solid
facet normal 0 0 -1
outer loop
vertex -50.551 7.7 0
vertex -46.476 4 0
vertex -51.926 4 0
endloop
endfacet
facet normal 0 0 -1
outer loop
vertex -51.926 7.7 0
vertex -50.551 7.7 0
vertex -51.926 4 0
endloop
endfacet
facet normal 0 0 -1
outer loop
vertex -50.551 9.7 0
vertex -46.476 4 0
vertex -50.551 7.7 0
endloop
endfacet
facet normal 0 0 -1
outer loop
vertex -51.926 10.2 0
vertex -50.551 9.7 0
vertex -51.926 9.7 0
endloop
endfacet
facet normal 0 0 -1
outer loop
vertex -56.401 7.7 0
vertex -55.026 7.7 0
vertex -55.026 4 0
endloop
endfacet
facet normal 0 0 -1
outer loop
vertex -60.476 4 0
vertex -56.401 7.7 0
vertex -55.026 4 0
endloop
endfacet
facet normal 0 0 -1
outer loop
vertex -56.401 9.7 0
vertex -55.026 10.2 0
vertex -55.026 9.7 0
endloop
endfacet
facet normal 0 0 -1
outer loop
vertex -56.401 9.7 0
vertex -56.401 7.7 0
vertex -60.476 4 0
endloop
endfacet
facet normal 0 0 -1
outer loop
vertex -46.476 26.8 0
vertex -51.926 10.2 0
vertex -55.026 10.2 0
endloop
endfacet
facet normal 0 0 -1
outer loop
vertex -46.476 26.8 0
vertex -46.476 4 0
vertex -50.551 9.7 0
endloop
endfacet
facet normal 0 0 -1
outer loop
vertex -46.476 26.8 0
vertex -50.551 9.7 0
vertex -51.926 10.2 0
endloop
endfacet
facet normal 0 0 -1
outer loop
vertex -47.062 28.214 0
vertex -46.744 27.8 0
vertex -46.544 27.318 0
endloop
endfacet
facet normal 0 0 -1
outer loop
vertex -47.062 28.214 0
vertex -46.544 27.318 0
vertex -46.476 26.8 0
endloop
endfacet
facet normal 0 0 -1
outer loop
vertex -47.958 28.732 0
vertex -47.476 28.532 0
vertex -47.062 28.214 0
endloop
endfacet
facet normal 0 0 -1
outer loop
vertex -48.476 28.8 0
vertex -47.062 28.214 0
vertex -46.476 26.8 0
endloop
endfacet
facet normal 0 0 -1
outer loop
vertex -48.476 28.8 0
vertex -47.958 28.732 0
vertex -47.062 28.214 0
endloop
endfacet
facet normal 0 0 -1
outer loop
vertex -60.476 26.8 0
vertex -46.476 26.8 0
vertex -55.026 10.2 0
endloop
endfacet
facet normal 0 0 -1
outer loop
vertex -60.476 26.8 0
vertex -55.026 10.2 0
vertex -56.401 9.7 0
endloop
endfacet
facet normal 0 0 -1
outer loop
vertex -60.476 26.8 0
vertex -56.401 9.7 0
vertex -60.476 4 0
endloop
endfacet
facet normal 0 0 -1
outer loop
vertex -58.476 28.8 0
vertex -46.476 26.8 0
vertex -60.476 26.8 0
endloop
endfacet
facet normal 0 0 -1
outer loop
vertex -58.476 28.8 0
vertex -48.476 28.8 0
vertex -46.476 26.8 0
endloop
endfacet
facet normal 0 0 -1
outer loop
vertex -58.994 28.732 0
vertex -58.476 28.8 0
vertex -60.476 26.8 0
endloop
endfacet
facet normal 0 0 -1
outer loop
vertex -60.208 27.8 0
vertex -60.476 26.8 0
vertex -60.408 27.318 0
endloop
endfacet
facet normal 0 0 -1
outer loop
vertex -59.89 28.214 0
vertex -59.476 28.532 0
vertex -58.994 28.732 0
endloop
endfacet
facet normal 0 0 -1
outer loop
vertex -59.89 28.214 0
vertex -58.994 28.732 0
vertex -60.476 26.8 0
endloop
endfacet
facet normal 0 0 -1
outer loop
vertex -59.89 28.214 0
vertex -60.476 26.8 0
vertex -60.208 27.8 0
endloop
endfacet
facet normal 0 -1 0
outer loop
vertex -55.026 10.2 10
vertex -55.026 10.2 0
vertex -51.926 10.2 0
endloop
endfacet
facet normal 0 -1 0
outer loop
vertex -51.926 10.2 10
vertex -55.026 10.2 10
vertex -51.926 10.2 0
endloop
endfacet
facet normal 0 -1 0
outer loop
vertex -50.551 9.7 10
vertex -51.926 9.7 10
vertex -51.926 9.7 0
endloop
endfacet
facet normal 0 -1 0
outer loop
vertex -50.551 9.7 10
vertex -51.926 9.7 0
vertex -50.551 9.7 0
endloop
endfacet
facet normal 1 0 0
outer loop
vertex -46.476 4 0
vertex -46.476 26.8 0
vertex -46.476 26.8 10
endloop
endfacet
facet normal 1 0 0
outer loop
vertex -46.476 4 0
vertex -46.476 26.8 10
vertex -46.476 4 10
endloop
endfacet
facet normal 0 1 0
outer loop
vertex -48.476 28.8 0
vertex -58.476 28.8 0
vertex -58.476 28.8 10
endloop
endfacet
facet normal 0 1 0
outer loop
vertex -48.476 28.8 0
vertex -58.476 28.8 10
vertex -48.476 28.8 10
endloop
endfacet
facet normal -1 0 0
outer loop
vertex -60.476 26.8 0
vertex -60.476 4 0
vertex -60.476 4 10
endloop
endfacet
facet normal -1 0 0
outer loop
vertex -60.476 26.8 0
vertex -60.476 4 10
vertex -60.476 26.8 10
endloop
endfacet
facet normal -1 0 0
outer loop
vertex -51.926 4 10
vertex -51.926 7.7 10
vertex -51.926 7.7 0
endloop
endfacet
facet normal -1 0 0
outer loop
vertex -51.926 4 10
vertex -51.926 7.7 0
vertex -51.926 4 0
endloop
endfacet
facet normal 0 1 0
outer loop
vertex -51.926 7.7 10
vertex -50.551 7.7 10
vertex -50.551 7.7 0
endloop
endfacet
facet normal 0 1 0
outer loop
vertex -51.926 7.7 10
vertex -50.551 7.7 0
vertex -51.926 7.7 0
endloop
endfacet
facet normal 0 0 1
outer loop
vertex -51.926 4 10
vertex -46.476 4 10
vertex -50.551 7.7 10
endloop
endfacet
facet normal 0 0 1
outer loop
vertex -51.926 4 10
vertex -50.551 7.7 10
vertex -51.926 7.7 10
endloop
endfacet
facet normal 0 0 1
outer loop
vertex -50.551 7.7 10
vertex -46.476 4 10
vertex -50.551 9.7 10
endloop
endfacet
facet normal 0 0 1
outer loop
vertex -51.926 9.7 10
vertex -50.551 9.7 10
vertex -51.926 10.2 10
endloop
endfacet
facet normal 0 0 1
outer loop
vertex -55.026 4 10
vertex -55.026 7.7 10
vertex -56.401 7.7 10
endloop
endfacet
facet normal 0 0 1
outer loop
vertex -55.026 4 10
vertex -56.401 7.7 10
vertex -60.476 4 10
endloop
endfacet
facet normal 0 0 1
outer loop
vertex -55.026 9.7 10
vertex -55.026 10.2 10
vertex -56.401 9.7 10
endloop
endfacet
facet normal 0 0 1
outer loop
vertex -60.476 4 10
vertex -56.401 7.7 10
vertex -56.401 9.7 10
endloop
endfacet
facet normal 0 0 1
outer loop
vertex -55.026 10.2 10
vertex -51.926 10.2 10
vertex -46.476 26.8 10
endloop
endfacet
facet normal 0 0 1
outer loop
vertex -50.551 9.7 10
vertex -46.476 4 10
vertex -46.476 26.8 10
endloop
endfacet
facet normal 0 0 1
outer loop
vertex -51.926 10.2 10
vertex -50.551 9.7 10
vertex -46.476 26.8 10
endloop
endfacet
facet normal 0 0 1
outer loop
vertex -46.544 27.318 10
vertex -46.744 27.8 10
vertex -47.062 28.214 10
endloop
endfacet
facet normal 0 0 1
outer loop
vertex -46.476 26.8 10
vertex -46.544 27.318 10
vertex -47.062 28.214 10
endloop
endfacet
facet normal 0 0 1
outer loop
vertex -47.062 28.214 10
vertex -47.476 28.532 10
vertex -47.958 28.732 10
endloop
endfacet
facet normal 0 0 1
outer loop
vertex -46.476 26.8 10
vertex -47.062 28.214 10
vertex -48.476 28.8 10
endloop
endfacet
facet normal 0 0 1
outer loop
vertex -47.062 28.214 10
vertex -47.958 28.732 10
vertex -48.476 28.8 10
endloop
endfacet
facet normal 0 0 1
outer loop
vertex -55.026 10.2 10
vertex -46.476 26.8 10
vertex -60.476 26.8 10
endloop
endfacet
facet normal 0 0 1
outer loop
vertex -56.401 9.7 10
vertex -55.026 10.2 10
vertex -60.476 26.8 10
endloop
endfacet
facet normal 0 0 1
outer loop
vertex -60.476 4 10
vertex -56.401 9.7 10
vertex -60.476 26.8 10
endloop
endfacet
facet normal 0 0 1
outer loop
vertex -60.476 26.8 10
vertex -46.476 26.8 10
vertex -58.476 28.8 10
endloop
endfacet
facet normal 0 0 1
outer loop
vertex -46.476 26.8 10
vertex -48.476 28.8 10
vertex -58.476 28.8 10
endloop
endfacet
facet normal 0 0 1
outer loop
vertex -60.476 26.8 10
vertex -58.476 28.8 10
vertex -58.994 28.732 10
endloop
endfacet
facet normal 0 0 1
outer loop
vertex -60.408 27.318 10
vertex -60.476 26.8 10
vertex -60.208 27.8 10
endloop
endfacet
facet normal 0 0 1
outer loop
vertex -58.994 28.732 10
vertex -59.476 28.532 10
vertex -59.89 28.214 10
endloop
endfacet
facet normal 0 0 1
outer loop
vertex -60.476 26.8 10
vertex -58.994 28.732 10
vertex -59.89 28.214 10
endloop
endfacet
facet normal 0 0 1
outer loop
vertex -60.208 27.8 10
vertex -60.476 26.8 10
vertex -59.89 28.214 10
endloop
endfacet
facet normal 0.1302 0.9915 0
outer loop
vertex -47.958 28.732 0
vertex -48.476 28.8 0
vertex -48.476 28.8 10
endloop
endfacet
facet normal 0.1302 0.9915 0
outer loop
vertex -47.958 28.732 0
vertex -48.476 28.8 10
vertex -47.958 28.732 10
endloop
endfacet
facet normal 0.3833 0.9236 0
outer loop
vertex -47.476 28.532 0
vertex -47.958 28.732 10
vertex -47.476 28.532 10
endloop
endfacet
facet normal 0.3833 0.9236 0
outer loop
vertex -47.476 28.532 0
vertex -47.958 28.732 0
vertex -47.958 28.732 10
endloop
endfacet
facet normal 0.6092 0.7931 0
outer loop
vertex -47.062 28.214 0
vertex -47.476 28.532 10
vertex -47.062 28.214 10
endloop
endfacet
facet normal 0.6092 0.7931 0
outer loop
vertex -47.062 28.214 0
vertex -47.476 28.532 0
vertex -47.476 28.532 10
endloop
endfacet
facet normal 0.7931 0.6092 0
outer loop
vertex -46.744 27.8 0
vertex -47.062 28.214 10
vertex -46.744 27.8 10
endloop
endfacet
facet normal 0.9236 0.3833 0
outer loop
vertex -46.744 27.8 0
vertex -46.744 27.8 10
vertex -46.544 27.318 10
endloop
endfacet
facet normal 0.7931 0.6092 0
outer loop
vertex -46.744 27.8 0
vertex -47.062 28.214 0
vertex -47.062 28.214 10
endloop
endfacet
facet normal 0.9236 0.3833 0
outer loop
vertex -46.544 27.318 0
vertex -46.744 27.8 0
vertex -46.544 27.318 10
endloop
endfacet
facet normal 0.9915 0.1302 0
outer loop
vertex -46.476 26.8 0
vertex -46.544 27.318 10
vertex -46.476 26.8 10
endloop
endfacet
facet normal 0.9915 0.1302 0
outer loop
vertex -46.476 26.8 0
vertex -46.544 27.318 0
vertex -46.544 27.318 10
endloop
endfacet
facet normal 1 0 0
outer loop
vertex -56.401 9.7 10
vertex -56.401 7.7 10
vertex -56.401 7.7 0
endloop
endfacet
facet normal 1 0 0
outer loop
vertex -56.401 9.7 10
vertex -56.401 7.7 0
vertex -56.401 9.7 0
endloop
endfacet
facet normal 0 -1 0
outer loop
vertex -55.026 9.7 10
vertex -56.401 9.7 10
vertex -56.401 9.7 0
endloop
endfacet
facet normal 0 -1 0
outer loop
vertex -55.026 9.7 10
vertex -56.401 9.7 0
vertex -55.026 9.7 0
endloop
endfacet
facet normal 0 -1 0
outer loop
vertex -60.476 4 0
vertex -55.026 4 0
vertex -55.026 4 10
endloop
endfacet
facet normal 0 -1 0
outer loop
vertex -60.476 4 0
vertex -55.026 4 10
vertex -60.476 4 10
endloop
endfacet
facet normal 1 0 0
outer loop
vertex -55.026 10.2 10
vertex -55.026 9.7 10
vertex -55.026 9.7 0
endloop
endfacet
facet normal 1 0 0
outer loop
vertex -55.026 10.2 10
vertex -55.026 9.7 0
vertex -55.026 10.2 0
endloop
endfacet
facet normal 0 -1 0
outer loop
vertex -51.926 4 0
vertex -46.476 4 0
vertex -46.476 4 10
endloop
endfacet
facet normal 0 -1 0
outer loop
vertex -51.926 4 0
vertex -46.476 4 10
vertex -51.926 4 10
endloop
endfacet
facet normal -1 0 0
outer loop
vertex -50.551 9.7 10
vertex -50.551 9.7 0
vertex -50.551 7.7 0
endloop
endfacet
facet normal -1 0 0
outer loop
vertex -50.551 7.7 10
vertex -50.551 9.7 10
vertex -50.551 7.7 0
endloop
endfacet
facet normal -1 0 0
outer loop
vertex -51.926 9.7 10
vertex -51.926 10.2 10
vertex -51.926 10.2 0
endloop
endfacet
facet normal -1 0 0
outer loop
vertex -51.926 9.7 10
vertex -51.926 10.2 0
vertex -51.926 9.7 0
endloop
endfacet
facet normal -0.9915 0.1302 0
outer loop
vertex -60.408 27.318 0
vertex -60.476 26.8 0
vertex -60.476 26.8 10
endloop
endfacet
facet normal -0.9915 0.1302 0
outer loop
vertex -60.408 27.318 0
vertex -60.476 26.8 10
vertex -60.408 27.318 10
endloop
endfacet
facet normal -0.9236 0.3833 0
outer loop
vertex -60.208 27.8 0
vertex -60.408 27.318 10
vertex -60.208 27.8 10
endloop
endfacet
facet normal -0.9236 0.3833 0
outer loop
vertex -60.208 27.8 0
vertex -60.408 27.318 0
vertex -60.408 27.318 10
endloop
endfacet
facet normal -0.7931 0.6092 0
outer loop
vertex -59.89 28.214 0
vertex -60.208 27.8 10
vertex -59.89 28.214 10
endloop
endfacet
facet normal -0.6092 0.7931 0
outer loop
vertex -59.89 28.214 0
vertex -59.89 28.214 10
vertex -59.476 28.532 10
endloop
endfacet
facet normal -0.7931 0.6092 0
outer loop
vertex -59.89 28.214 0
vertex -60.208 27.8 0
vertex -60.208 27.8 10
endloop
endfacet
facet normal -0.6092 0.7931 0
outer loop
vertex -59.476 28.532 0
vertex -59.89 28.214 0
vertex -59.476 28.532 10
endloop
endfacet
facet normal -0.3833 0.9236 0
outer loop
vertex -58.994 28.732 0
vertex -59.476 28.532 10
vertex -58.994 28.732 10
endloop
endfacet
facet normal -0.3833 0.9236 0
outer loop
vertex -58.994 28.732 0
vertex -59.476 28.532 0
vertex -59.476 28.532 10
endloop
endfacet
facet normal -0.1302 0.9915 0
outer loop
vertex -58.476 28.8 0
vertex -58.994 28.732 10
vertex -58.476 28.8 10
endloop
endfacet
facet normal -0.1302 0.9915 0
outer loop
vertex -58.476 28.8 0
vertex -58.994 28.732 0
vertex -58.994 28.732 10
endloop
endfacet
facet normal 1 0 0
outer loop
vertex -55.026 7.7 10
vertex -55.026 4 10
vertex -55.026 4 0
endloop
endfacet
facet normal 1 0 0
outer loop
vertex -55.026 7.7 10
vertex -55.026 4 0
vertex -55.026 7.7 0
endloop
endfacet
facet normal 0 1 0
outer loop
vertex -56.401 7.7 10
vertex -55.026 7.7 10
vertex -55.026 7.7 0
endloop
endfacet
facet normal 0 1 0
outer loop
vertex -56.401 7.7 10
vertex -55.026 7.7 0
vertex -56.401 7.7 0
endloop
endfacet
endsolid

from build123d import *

# Parameters (mm, degrees)
DODANIE_WYCI_GNI_CIE1_DEPTH = 10
WYTNIJ_WYCI_GNI_CIE1_DEPTH  = 10


with BuildPart() as part:
    # Szkic1 → Dodanie-wyciągnięcie1 (new body)
    with BuildSketch(Plane.XY):
        with BuildLine():
            Line((-46.47600649, 4), (-60.47600649, 4))
            Line((-60.47600649, 4), (-60.47600649, 26.8))
            ThreePointArc((-60.47600649, 26.8), (-59.890220053, 28.214213562), (-58.47600649, 28.8))
            Line((-58.47600649, 28.8), (-48.47600649, 28.8))
            ThreePointArc((-48.47600649, 28.8), (-47.061792928, 28.214213562), (-46.47600649, 26.8))
            Line((-46.47600649, 26.8), (-46.47600649, 4))
        make_face()
    extrude(amount=DODANIE_WYCI_GNI_CIE1_DEPTH)

    # Szkic3 → Wytnij-wyciągnięcie1 (cut)
    with BuildSketch(Plane.XY.offset(10)):
        Polygon((-51.92600649, 4), (-55.02600649, 4), (-55.02600649, 7.7), (-56.40100649, 7.7), (-56.40100649, 9.7), (-55.02600649, 9.7), (-55.02600649, 10.2), (-51.92600649, 10.2), (-51.92600649, 9.7), (-50.55100649, 9.7), (-50.55100649, 7.7), (-51.92600649, 7.7), align=None)
    extrude(amount=-WYTNIJ_WYCI_GNI_CIE1_DEPTH, mode=Mode.SUBTRACT)


solid = part.part
